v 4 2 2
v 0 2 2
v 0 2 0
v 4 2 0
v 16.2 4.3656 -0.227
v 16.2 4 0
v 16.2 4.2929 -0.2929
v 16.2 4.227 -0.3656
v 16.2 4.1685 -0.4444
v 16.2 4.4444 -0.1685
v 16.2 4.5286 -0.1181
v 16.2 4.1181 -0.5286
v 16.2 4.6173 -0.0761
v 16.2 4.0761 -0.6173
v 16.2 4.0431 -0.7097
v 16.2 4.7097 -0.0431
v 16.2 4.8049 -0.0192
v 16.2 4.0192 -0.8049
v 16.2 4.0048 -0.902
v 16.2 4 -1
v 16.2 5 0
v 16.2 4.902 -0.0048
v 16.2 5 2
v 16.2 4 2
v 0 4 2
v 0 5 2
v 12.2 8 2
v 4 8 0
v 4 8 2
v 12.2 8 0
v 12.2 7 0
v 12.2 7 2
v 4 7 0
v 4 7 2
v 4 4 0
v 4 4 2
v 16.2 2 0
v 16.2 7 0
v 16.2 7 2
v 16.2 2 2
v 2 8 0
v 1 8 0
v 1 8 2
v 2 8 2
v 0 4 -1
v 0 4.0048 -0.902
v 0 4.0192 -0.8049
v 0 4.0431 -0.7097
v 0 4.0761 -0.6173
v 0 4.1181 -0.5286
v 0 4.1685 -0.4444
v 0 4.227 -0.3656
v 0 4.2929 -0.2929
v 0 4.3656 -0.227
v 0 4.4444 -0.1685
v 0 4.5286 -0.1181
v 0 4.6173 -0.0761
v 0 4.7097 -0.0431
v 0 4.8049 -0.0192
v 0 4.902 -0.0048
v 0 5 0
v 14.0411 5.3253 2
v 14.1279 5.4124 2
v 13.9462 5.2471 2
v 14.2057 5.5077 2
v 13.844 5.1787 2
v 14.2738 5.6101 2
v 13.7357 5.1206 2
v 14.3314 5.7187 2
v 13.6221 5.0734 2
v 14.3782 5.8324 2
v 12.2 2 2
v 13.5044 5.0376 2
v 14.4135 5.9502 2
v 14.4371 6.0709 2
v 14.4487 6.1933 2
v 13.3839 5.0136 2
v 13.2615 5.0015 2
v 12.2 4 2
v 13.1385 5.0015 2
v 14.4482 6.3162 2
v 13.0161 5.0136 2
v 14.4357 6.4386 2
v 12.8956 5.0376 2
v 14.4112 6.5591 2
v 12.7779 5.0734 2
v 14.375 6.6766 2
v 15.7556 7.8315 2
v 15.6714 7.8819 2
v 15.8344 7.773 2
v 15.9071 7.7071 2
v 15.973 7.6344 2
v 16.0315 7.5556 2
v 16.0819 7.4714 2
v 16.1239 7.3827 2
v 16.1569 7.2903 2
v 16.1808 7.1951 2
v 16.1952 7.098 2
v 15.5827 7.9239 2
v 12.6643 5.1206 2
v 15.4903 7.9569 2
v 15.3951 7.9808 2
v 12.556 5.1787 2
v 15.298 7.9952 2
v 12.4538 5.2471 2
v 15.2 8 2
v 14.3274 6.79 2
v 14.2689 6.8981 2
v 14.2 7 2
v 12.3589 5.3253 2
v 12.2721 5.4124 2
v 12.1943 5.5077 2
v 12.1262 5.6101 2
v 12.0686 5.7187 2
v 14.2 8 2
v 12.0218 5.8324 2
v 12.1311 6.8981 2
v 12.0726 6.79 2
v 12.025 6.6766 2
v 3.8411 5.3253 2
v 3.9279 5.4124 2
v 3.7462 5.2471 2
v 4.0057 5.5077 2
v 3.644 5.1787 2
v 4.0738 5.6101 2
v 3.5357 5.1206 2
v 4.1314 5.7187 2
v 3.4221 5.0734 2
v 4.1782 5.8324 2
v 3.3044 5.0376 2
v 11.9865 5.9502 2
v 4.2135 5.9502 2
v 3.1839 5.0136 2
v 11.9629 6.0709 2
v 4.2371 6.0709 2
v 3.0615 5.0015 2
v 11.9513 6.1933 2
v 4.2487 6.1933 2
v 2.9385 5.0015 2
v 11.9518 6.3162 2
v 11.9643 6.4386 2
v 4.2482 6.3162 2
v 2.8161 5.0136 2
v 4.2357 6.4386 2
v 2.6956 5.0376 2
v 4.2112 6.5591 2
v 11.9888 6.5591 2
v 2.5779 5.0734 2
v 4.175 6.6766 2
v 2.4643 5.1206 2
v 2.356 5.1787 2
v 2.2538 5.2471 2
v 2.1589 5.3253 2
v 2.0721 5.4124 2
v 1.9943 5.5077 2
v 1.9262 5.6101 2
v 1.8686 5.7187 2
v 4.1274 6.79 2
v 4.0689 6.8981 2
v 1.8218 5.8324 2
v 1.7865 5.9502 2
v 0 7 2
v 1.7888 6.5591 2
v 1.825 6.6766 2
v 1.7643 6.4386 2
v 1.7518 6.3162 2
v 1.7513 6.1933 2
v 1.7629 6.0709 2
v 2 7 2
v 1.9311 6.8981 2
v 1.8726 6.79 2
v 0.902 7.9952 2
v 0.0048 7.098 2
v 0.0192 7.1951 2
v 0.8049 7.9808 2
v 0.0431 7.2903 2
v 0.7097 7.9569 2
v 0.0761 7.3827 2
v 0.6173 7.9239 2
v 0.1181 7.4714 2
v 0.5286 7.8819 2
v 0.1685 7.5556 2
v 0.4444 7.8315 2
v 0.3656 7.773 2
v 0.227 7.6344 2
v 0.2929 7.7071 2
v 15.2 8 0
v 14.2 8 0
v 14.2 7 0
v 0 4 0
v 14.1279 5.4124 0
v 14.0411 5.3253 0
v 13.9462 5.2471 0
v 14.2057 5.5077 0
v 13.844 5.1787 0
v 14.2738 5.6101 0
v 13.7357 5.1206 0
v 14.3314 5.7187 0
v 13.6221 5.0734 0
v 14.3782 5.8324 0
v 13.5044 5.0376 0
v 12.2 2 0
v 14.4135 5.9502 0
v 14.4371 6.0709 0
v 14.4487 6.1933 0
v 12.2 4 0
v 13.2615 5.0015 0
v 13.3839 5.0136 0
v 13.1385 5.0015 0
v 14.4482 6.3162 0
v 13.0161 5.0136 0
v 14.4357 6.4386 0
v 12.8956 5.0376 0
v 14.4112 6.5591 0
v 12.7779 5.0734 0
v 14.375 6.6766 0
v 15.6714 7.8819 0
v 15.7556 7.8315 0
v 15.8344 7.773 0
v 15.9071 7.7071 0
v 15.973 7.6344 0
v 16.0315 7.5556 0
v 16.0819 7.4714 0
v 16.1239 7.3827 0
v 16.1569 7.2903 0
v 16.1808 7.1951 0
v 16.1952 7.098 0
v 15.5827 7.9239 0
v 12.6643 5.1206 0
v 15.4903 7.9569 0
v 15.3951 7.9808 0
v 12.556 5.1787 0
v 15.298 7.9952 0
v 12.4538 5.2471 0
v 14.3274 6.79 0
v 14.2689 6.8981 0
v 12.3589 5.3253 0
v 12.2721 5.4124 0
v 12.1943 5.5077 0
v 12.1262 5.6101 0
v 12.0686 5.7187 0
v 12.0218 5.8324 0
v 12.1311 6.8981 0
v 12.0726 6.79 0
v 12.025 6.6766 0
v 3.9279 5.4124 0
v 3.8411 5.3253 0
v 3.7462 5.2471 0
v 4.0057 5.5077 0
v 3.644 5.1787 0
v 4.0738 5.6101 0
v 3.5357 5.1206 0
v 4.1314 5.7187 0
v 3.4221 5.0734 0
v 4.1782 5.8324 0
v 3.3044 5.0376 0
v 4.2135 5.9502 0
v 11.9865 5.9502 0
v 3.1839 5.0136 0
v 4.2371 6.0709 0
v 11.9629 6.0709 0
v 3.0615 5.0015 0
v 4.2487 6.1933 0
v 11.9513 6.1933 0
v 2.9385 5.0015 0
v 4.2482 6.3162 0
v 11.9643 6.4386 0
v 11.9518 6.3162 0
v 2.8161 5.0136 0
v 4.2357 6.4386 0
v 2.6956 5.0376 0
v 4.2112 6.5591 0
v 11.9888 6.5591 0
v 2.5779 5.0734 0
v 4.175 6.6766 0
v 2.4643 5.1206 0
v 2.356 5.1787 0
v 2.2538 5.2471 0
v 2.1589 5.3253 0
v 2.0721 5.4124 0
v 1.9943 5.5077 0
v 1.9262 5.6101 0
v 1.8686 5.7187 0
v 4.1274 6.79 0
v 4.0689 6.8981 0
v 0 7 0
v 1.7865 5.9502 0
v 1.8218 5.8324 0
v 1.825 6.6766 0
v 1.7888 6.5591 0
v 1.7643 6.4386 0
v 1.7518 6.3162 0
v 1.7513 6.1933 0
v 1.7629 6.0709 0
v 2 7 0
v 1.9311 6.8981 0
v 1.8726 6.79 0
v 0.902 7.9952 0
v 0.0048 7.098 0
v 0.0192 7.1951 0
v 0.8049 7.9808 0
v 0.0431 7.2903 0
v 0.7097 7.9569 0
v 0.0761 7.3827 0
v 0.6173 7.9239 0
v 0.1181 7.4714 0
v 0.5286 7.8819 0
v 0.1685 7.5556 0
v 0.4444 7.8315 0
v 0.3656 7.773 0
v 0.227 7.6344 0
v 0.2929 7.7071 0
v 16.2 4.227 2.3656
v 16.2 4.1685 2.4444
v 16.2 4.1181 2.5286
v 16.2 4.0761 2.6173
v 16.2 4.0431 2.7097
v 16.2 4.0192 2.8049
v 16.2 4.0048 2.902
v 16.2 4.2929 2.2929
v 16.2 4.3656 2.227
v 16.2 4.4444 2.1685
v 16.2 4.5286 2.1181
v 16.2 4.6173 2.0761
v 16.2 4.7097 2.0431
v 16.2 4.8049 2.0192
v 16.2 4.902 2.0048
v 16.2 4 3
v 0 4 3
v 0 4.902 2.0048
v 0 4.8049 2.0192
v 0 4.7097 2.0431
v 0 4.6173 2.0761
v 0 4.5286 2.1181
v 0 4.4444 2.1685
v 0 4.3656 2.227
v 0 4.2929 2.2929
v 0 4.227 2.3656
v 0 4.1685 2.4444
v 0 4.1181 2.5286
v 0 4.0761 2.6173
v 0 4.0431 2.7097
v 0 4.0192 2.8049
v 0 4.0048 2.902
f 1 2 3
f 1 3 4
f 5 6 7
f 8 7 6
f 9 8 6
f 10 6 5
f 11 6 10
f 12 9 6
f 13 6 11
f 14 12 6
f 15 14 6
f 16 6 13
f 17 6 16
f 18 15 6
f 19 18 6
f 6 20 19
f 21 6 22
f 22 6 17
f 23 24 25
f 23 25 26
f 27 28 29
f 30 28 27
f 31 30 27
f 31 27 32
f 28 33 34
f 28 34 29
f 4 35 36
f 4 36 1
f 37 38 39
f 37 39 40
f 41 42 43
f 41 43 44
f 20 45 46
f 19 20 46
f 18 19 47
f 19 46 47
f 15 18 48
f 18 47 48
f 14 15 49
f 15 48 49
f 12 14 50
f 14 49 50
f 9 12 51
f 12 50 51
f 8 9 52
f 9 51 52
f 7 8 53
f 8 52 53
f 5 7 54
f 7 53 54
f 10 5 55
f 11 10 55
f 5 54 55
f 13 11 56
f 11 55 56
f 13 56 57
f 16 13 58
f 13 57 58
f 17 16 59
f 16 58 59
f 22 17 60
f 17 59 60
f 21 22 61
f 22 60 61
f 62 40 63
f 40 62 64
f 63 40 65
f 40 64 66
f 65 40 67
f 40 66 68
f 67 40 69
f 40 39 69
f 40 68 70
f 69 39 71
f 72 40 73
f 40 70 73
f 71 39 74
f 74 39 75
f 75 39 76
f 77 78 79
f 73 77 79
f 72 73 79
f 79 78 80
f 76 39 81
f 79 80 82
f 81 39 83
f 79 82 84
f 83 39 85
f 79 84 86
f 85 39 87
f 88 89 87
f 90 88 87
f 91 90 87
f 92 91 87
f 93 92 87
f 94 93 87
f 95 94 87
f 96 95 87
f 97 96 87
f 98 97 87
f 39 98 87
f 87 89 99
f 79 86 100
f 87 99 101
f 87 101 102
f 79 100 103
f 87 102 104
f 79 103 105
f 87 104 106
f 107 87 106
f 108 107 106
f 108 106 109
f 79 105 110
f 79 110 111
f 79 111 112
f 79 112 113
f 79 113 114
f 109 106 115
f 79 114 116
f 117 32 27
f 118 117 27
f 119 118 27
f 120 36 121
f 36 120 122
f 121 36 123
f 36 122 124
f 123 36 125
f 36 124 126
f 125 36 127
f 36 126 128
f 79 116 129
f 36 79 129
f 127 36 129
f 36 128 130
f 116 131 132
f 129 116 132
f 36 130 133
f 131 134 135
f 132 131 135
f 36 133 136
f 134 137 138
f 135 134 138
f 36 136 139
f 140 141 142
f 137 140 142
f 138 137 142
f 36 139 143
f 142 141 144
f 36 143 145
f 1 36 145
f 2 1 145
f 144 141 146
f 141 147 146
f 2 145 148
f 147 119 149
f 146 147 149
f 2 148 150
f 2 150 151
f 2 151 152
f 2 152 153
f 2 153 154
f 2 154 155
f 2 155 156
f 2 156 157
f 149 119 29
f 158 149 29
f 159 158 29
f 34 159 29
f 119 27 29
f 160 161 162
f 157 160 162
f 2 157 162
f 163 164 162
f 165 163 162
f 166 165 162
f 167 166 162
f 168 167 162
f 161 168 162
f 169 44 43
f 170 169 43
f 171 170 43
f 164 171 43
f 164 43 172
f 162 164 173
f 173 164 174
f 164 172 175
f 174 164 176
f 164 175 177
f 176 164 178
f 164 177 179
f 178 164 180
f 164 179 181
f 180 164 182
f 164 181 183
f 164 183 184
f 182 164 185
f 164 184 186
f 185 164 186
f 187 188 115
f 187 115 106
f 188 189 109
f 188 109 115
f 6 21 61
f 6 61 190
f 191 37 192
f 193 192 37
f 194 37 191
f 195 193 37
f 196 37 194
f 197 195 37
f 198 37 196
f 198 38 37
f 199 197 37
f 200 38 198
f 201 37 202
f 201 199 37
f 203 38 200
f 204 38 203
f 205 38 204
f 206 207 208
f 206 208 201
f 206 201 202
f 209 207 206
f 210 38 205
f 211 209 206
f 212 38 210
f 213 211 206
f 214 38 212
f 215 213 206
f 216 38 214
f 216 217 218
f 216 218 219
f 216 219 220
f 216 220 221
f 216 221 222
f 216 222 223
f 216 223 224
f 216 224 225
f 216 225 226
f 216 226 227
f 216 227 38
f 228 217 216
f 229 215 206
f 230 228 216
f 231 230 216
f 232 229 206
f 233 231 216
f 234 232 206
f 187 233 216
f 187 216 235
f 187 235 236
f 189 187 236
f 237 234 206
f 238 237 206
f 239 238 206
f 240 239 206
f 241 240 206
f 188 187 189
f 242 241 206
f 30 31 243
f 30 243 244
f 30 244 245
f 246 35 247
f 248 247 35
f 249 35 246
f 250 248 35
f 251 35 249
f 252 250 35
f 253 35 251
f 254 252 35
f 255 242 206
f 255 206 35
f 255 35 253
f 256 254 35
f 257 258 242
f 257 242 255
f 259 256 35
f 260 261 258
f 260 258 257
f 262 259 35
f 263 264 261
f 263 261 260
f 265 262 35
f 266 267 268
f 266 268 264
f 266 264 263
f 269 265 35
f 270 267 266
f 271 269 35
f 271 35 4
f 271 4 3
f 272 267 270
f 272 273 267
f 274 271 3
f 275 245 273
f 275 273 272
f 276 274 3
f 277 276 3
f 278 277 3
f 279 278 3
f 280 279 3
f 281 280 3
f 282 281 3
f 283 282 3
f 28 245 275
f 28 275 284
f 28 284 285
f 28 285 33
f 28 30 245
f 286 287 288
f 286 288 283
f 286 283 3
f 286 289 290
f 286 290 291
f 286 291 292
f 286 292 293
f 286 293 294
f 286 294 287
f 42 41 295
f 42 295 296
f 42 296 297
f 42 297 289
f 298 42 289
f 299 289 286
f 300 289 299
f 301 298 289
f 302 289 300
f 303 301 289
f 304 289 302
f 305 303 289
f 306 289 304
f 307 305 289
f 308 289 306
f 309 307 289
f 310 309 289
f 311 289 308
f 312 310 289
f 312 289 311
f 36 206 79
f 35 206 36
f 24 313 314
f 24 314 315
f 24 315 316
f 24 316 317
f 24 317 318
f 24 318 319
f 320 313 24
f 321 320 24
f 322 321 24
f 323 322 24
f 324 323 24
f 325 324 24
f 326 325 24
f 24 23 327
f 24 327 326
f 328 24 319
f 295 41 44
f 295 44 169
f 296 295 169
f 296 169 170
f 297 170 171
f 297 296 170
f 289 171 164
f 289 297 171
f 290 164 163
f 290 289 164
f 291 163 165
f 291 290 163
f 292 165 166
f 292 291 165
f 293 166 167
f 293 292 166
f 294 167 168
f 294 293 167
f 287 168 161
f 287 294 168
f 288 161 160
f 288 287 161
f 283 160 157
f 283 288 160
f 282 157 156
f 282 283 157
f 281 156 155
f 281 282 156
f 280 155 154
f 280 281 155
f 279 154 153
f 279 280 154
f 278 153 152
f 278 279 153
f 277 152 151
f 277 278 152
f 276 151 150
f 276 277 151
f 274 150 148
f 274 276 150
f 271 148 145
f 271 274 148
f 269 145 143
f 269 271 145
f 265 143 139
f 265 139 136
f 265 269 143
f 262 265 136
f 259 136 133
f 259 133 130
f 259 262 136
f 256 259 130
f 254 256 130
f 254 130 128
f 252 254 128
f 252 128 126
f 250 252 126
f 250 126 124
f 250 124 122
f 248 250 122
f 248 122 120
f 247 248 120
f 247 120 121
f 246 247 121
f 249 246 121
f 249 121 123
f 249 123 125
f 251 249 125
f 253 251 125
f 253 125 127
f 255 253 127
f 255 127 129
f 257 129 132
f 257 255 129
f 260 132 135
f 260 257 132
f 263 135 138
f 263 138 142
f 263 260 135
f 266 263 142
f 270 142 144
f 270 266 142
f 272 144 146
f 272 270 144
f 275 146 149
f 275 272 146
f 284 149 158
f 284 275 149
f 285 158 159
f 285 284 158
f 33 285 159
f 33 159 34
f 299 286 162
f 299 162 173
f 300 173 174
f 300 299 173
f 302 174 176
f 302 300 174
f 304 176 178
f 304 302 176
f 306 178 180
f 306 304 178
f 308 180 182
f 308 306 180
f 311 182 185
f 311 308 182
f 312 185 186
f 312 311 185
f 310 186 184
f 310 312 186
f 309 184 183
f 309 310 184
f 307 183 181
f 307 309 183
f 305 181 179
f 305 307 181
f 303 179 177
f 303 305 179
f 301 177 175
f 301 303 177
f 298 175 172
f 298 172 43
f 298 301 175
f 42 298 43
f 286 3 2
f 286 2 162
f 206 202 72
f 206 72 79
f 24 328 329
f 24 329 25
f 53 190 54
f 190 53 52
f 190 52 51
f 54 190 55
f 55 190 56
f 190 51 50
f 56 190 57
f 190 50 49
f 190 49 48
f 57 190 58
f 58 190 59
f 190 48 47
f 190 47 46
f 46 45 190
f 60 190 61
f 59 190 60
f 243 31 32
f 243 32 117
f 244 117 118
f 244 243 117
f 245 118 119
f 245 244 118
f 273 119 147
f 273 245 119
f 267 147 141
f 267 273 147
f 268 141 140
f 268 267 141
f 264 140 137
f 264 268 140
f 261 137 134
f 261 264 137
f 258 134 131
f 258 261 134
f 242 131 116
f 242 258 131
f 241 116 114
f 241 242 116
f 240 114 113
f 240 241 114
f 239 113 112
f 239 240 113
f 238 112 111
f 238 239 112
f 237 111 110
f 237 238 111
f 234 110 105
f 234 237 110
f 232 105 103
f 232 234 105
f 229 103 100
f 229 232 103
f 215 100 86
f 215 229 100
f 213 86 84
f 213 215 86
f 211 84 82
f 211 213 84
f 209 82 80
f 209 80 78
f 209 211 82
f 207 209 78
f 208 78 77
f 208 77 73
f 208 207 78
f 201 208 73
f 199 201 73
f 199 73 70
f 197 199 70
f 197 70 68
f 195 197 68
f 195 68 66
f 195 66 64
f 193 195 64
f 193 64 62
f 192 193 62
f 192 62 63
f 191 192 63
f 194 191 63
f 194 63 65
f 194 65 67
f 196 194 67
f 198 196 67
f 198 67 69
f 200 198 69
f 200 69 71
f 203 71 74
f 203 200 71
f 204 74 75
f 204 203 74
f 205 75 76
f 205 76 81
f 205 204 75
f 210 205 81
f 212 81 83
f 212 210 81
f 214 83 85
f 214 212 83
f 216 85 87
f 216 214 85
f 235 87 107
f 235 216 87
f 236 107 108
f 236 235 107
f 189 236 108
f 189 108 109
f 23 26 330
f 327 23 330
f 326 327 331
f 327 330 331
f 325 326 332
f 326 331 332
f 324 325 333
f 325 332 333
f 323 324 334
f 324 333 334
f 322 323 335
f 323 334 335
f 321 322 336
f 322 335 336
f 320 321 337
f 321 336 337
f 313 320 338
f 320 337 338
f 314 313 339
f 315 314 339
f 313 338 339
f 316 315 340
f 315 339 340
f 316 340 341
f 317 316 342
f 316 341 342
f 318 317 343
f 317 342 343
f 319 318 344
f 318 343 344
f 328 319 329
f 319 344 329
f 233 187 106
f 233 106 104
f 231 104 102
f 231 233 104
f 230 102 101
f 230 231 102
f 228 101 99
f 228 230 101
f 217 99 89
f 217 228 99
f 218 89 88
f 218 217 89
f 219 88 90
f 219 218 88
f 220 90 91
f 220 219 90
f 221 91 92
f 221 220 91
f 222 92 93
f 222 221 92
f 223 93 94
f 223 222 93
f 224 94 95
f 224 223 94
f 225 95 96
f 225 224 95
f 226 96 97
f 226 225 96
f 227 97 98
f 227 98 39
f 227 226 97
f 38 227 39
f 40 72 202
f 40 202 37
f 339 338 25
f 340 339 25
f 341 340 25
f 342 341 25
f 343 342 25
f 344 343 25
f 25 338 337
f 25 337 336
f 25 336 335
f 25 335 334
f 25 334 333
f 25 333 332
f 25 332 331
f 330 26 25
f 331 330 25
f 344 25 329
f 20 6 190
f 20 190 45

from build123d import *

# Parameters (mm, degrees)
BOSS_EXTRUDE1_DEPTH   = 2
BOSS_EXTRUDE2_DEPTH   = 16.2
BOSS_EXTRUDE2_2_DEPTH = 16.2
SKETCH3_W             = 4
SKETCH3_H             = 2
CUT_EXTRUDE1_DEPTH    = 19.315021158


with BuildPart() as part:
    # Sketch1 → Boss-Extrude1 (new body)
    with BuildSketch(Plane.XY):
        with BuildLine():
            Line((4, 8), (12.2, 8))
            Line((12.2, 8), (12.2, 7))
            ThreePointArc((12.2, 7), (13.2, 5), (14.2, 7))
            Line((14.2, 7), (14.2, 8))
            Line((14.2, 8), (15.2, 8))
            ThreePointArc((15.2, 8), (15.907106781, 7.707106781), (16.2, 7))
            Line((16.2, 7), (16.2, 0))
            Line((16.2, 0), (12.2, 0))
            Line((12.2, 0), (12.2, 4))
            Line((12.2, 4), (4, 4))
            Line((4, 4), (4, 0))
            Line((4, 0), (0, 0))
            Line((0, 0), (0, 7))
            ThreePointArc((0, 7), (0.292893219, 7.707106781), (1, 8))
            Line((1, 8), (2, 8))
            Line((2, 8), (2, 7))
            ThreePointArc((2, 7), (3, 5), (4, 7))
            Line((4, 7), (4, 8))
        make_face()
    extrude(amount=BOSS_EXTRUDE1_DEPTH)

    # Sketch3 → Cut-Extrude1 (cut, through all)
    with BuildSketch(Plane.XY.offset(2)):
        with Locations((2, 1)):
            Rectangle(SKETCH3_W, SKETCH3_H)
        with Locations((14.2, 1)):
            Rectangle(SKETCH3_W, SKETCH3_H)
    extrude(amount=-CUT_EXTRUDE1_DEPTH, mode=Mode.SUBTRACT)


with BuildPart() as body_2:
    # Sketch2 → Boss-Extrude2 (new body)
    with BuildSketch(Plane.ZY):
        with BuildLine():
            Line((2, 4), (2, 5))
            ThreePointArc((2, 5), (2.292893219, 4.292893219), (3, 4))
            Line((3, 4), (2, 4))
        make_face()
    extrude(amount=-BOSS_EXTRUDE2_DEPTH)


with BuildPart() as body_3:
    # Sketch2 → Boss-Extrude2 2 (new body)
    with BuildSketch(Plane.ZY):
        with BuildLine():
            Line((0, 4), (-1, 4))
            ThreePointArc((-1, 4), (-0.292893219, 4.292893219), (0, 5))
            Line((0, 5), (0, 4))
        make_face()
    extrude(amount=-BOSS_EXTRUDE2_2_DEPTH)


solid = Compound([part.part, body_2.part, body_3.part])
